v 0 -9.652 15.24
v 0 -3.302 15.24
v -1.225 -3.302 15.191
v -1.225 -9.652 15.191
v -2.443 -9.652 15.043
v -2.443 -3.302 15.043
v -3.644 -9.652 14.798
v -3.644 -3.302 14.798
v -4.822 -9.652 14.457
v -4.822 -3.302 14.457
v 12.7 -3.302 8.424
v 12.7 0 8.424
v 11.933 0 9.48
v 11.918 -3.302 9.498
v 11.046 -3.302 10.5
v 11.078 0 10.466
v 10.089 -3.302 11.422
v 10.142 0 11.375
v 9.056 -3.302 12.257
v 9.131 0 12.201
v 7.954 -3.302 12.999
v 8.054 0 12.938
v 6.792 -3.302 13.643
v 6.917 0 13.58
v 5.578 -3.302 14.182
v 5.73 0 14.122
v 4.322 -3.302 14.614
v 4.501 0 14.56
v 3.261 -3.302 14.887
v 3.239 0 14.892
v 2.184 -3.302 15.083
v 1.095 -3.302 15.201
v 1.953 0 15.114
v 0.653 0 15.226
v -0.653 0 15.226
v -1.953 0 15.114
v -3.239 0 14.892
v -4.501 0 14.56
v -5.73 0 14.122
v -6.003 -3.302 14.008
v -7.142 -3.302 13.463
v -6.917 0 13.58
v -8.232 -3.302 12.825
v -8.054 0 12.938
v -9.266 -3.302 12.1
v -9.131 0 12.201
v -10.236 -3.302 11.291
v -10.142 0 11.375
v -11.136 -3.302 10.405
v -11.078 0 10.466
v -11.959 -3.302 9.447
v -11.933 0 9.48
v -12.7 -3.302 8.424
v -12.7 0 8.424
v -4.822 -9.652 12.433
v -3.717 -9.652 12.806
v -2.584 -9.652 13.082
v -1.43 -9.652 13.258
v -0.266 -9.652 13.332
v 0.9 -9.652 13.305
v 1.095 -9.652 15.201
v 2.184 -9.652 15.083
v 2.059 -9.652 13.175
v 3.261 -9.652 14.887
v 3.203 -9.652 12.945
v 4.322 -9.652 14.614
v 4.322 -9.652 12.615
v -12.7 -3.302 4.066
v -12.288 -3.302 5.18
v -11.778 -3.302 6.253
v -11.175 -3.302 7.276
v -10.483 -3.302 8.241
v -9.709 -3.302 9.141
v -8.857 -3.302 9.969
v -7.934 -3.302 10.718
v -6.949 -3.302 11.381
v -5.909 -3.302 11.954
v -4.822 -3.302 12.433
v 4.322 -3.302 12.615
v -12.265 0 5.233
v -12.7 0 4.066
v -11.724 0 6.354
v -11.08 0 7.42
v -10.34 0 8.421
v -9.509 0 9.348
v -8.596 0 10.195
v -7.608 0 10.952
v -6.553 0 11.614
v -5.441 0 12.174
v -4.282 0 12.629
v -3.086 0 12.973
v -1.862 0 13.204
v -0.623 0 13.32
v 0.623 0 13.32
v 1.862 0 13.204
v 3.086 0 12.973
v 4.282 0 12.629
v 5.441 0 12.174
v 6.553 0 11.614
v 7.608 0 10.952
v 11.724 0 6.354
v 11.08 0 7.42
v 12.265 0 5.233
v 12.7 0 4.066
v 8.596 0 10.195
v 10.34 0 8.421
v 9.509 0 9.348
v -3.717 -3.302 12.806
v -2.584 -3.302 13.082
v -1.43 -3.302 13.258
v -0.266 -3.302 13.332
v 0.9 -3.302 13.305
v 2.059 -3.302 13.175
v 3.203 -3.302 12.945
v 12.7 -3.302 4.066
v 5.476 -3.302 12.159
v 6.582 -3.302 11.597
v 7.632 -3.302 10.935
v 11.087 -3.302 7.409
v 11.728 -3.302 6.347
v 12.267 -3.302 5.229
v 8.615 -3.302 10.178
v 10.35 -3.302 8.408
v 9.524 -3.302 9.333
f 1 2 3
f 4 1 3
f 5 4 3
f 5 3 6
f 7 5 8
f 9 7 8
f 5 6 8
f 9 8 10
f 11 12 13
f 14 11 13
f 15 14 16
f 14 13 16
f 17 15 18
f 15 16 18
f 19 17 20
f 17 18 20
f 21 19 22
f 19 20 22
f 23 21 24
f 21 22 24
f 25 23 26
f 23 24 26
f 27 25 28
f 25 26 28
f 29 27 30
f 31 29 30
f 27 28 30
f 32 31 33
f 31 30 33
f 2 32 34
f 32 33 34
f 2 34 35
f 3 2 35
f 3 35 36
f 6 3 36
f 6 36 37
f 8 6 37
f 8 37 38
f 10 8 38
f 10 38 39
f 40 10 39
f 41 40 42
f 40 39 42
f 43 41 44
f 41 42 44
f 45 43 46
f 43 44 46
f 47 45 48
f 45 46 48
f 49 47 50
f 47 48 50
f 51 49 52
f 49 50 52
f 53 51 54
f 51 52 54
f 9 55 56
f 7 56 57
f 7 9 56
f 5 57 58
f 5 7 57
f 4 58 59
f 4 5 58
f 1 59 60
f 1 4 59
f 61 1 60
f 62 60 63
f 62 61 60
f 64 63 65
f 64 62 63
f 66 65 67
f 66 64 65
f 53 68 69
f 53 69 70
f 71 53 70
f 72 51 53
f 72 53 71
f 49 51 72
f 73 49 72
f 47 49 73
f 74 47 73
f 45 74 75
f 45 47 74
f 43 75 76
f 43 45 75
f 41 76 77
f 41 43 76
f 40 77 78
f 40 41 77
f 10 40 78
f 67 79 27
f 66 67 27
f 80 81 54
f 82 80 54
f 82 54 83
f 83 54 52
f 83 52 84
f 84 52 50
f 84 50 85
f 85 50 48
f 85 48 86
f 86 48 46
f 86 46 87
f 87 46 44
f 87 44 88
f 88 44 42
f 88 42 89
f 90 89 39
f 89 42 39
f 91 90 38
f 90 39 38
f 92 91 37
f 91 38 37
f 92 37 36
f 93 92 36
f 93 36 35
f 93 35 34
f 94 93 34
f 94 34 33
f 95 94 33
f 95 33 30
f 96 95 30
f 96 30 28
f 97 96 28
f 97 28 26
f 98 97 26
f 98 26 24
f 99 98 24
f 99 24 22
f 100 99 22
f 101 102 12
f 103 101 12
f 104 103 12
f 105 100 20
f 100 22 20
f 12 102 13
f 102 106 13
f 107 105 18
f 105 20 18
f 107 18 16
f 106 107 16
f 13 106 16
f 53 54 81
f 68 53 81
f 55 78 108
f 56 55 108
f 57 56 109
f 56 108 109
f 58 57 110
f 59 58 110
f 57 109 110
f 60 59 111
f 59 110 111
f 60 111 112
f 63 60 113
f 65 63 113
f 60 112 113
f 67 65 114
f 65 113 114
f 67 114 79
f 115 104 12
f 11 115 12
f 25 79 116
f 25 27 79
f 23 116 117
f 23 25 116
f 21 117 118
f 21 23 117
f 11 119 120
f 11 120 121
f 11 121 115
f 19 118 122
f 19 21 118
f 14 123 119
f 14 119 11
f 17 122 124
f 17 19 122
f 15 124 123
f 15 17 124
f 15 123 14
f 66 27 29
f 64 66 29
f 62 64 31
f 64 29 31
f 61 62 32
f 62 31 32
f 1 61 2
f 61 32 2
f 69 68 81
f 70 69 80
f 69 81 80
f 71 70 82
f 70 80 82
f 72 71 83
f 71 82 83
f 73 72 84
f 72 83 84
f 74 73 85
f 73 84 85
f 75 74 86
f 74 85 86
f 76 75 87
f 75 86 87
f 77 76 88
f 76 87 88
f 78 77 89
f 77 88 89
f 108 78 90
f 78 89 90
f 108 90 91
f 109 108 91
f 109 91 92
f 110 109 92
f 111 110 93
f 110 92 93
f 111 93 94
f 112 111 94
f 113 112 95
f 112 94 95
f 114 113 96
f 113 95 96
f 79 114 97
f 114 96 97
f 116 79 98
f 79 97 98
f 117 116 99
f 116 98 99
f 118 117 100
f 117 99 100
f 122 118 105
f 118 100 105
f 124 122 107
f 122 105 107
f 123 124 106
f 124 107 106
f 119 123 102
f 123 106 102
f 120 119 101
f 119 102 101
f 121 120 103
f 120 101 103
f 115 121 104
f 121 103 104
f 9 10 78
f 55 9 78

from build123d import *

# Parameters (mm, degrees)
F1_DEPTH = 3.302
F3_DEPTH = 6.35


with BuildPart() as f1:
    # F0 (on Front) → F1 (new body)
    with BuildSketch(Plane.XZ):
        with BuildLine():
            Line((12.7, 4.0659838908), (12.7, 8.4242269675))
            ThreePointArc((12.7, 8.4242269675), (0, 15.24), (-12.7, 8.4242269675))
            Line((-12.7, 8.4242269675), (-12.7, 4.0659838908))
            ThreePointArc((-12.7, 4.0659838908), (0, 13.335), (12.7, 4.0659838908))
        make_face()
    extrude(amount=F1_DEPTH)

    # F2 (on face) → F3 (join)
    with BuildSketch(Plane.XZ.offset(3.302)):
        with BuildLine():
            ThreePointArc((4.3219749297, 14.6143125978), (2.1835150571, 15.0827670537), (0, 15.24))
            ThreePointArc((0, 15.24), (-2.4425893067, 15.0429836628), (-4.8220250703, 14.4570285405))
            Line((-4.8220250703, 14.4570285405), (-4.8220250703, 12.4326304225))
            ThreePointArc((-4.8220250703, 12.4326304225), (-0.2661645943, 13.3323434327), (4.3219749297, 12.6151796542))
            Line((4.3219749297, 12.6151796542), (4.3219749297, 14.6143125978))
        make_face()
    extrude(amount=F3_DEPTH)


solid = f1.part
